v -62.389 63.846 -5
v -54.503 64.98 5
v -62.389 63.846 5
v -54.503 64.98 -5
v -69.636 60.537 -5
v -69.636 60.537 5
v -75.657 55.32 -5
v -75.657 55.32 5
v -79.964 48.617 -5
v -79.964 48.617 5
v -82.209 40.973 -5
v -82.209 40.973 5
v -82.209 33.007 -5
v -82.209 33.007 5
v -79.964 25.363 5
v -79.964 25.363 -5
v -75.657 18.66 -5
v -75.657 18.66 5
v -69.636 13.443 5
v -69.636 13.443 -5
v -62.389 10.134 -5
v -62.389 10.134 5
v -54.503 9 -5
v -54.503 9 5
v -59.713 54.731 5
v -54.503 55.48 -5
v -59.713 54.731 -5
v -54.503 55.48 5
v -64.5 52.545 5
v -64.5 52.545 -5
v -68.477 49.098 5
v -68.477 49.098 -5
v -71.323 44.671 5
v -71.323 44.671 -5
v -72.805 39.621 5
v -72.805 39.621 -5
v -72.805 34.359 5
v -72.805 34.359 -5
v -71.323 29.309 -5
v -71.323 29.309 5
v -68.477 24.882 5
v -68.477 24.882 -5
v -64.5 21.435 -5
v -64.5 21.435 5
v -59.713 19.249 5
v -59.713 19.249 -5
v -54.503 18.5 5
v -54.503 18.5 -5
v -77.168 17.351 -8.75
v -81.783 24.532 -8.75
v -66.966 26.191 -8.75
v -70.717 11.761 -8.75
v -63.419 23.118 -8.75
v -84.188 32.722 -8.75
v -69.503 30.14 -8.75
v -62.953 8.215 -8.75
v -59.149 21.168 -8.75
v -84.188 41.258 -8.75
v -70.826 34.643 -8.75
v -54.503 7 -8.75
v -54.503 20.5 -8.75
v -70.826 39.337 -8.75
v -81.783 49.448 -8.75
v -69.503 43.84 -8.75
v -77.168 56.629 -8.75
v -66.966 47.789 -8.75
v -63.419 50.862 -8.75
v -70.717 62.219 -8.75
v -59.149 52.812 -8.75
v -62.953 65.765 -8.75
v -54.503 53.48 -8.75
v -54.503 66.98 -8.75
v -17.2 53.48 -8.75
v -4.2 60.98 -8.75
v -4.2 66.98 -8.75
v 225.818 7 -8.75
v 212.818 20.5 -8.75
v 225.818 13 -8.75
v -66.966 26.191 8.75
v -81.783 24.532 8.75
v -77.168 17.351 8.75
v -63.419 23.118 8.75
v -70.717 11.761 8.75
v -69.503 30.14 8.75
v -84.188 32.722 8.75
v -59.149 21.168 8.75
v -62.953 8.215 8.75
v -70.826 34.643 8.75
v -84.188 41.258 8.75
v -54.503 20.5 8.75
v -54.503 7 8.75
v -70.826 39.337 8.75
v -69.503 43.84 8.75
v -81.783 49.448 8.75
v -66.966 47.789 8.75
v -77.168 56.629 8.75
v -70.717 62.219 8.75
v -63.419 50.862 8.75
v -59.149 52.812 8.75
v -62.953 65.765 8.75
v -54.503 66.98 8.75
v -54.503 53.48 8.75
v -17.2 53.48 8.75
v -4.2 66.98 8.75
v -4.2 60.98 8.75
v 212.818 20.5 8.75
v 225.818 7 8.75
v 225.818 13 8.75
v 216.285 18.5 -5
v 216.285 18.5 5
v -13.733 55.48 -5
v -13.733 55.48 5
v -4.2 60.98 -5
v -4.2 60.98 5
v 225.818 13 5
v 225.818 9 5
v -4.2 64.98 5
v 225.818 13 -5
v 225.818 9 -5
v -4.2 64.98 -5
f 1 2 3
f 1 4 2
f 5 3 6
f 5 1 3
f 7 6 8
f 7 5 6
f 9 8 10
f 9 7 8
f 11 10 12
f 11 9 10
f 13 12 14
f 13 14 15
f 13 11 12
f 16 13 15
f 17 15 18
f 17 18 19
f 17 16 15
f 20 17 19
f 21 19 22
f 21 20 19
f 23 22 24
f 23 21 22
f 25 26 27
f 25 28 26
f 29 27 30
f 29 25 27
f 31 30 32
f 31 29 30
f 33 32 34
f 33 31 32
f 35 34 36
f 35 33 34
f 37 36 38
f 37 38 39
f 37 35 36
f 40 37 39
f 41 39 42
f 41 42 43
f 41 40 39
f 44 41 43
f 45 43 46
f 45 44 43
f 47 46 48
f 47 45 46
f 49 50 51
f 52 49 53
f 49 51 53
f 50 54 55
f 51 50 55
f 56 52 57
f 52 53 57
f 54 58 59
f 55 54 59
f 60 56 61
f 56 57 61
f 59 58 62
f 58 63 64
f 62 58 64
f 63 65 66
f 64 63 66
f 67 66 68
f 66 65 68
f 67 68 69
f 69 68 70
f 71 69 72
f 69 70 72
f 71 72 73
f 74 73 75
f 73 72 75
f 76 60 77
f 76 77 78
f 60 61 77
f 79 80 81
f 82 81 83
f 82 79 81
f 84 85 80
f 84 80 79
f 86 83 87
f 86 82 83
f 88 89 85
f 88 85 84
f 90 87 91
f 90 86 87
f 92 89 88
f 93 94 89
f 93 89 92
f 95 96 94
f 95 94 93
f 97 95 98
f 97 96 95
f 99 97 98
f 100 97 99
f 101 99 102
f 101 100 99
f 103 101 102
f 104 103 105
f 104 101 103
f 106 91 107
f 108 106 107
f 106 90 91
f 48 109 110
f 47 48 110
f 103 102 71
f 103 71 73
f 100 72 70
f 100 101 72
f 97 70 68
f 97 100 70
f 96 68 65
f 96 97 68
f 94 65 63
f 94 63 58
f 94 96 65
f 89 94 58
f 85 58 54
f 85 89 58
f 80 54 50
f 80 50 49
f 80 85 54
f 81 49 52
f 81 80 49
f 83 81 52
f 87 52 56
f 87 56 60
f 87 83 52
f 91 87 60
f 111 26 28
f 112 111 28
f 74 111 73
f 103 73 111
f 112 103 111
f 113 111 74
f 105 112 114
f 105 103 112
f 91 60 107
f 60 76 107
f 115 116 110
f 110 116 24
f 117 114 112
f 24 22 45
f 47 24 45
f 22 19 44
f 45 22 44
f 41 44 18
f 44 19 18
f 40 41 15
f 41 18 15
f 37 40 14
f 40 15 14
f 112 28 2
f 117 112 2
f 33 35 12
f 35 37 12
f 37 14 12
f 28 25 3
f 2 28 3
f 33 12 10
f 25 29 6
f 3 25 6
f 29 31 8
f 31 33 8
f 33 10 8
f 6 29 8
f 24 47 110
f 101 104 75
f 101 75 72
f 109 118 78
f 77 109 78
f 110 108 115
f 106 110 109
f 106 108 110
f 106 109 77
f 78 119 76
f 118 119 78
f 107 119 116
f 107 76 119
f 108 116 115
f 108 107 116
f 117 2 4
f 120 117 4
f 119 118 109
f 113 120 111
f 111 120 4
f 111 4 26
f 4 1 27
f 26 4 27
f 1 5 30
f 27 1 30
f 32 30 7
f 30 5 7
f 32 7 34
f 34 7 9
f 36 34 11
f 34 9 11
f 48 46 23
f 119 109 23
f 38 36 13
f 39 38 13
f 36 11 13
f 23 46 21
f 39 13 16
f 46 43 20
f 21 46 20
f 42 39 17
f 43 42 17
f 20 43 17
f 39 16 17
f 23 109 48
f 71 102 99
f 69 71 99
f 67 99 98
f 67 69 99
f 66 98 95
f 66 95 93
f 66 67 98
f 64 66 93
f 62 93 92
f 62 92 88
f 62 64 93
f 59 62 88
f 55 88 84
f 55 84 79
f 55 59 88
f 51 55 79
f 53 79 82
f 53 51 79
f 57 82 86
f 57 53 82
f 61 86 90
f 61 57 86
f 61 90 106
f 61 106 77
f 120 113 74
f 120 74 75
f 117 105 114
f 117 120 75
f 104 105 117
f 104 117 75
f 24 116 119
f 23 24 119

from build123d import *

# Parameters (mm, degrees)
SKETCH2_W           = 17.5
SKETCH2_H           = 13.5
BOSS_EXTRUDE1_DEPTH = 17.5
SKETCH4_W           = 10
SKETCH4_H           = 9.5


with BuildPart() as part:
    # Sweep1: sweep along a path in Sketch1
    with BuildLine(Plane.XY) as sweep1_path:
        Line((-26.2, 66.98), (-54.503416211, 66.98))
        ThreePointArc((-54.503416211, 66.98), (-84.493416211, 36.99), (-54.503416211, 7))
        Line((-54.503416211, 7), (203.81795526, 7))
    # Sketch2 → Sweep1 (sweep)
    with BuildSketch(Plane(origin=(203.81795526, 7, 0), x_dir=(0, 0, 1), z_dir=(-1, 0, 0))):
        with Locations((0, 6.75)):
            Rectangle(SKETCH2_W, SKETCH2_H)
    sweep(path=sweep1_path.line)

    # Sketch3 → Boss-Extrude1 (add)
    with BuildSketch(Plane.XY.offset(8.75)):
        Polygon((-26.2, 66.98), (-26.2, 53.48), (-17.2, 53.48), (-4.2, 60.98), (-4.2, 66.98), align=None)
        Polygon((203.81795526, 20.5), (203.81795526, 7), (225.81795526, 7), (225.81795526, 13), (212.81795526, 20.5), align=None)
    extrude(amount=-BOSS_EXTRUDE1_DEPTH)

    # Cut-Sweep2: sweep along a path in Sketch5
    with BuildLine(Plane.XY) as cut_sweep2_path:
        Line((-4.2, 66.98), (-26.2, 66.98))
        Line((-26.2, 66.98), (-54.503416211, 66.98))
        ThreePointArc((-54.503416211, 66.98), (-84.493416211, 36.99), (-54.503416211, 7))
        Line((-54.503416211, 7), (203.81795526, 7))
        Line((203.81795526, 7), (225.81795526, 7))
    # Sketch4 → Cut-Sweep2 (sweep, cut)
    with BuildSketch(Plane(origin=(225.81795526, 0, 0), x_dir=(0, 0, -1), z_dir=(1, 0, 0))):
        with Locations((0, 13.75)):
            Rectangle(SKETCH4_W, SKETCH4_H)
    sweep(path=cut_sweep2_path.line, mode=Mode.SUBTRACT)


solid = part.part
